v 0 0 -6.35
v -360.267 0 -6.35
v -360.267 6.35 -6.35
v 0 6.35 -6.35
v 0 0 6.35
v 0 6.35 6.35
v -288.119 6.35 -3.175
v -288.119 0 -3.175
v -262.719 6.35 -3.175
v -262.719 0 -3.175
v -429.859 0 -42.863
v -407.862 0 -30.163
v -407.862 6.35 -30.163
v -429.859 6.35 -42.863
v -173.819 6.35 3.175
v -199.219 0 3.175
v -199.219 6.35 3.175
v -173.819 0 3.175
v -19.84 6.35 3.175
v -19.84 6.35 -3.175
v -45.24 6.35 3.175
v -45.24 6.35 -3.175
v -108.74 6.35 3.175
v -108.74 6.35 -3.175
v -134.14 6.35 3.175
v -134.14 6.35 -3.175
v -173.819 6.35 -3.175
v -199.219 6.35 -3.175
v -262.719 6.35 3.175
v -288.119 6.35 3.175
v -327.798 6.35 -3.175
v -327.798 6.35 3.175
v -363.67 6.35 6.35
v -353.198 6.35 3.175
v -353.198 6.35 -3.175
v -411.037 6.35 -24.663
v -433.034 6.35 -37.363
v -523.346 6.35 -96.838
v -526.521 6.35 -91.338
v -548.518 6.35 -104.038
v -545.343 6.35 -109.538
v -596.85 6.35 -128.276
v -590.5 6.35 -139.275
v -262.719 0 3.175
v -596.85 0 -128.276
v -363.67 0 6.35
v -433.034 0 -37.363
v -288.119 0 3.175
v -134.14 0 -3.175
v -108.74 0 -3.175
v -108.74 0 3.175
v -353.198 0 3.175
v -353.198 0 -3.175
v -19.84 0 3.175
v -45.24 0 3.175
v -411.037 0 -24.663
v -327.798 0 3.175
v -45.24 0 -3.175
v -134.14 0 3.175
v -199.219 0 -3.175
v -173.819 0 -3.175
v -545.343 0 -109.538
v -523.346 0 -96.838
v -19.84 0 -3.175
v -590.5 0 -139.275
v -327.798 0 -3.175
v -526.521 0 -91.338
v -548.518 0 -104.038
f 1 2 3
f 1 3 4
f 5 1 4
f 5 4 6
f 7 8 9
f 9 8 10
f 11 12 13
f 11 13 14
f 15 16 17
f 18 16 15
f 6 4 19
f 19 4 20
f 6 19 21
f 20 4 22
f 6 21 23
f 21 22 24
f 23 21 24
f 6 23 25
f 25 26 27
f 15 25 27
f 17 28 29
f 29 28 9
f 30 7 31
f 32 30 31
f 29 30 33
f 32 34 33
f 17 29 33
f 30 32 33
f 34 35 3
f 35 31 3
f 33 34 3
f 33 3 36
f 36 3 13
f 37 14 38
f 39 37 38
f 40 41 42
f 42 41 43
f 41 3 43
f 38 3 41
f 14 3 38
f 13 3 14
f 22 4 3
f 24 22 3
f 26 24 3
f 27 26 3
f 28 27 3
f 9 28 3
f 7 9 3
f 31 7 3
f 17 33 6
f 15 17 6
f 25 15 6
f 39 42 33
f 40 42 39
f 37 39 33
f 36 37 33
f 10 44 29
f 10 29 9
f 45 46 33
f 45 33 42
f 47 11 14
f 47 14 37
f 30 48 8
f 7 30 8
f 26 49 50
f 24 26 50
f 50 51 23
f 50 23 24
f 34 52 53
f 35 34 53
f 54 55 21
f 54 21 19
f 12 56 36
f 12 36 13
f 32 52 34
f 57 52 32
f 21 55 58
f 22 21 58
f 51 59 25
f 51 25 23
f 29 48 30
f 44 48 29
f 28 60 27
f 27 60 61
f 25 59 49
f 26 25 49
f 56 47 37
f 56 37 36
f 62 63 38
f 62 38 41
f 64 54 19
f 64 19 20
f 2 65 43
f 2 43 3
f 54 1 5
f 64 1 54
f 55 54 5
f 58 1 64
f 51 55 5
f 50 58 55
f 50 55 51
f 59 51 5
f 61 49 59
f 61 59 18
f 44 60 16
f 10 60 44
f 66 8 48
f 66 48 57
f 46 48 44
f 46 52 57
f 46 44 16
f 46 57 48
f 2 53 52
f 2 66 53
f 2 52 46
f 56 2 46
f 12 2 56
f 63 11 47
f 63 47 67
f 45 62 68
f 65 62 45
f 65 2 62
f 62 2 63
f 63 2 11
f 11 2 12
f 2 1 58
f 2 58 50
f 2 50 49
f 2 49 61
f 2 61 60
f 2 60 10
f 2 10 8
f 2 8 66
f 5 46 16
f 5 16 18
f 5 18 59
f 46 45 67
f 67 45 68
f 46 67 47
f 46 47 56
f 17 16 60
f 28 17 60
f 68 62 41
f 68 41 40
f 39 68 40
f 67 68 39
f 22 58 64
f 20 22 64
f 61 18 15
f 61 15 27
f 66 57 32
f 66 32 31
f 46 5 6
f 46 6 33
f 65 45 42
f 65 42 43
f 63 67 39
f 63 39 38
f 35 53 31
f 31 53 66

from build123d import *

# Parameters (mm, degrees)
SKETCH4_W           = 25.4
SKETCH4_H           = 6.35
BOSS_EXTRUDE2_DEPTH = 6.35


with BuildPart() as part:
    # Sketch4 → Boss-Extrude2 (new body)
    with BuildSketch(Plane(origin=(0, 0, 0), x_dir=(1, 0, 0), z_dir=(0, 1, 0))):
        Polygon((-596.849633079, 128.276111157), (-590.499633079, 139.274633785), (-360.267413785, 6.35), (0, 6.35), (0, -6.35), (-363.670368529, -6.35), align=None)
        Polygon((-548.51841191, 104.038241814), (-526.521366654, 91.338241814), (-523.346366654, 96.837503128), (-545.34341191, 109.537503128), align=None, mode=Mode.SUBTRACT)
        Polygon((-433.033924315, 37.363241814), (-411.036879059, 24.663241814), (-407.861879059, 30.162503128), (-429.858924315, 42.862503128), align=None, mode=Mode.SUBTRACT)
        with Locations((-340.498292116, 0)):
            Rectangle(SKETCH4_W, SKETCH4_H, mode=Mode.SUBTRACT)
        with Locations((-275.418975234, 0)):
            Rectangle(SKETCH4_W, SKETCH4_H, mode=Mode.SUBTRACT)
        with Locations((-186.518975234, 0)):
            Rectangle(SKETCH4_W, SKETCH4_H, mode=Mode.SUBTRACT)
        with Locations((-121.439658352, 0)):
            Rectangle(SKETCH4_W, SKETCH4_H, mode=Mode.SUBTRACT)
        with Locations((-32.539658352, 0)):
            Rectangle(SKETCH4_W, SKETCH4_H, mode=Mode.SUBTRACT)
    extrude(amount=BOSS_EXTRUDE2_DEPTH)


solid = part.part
